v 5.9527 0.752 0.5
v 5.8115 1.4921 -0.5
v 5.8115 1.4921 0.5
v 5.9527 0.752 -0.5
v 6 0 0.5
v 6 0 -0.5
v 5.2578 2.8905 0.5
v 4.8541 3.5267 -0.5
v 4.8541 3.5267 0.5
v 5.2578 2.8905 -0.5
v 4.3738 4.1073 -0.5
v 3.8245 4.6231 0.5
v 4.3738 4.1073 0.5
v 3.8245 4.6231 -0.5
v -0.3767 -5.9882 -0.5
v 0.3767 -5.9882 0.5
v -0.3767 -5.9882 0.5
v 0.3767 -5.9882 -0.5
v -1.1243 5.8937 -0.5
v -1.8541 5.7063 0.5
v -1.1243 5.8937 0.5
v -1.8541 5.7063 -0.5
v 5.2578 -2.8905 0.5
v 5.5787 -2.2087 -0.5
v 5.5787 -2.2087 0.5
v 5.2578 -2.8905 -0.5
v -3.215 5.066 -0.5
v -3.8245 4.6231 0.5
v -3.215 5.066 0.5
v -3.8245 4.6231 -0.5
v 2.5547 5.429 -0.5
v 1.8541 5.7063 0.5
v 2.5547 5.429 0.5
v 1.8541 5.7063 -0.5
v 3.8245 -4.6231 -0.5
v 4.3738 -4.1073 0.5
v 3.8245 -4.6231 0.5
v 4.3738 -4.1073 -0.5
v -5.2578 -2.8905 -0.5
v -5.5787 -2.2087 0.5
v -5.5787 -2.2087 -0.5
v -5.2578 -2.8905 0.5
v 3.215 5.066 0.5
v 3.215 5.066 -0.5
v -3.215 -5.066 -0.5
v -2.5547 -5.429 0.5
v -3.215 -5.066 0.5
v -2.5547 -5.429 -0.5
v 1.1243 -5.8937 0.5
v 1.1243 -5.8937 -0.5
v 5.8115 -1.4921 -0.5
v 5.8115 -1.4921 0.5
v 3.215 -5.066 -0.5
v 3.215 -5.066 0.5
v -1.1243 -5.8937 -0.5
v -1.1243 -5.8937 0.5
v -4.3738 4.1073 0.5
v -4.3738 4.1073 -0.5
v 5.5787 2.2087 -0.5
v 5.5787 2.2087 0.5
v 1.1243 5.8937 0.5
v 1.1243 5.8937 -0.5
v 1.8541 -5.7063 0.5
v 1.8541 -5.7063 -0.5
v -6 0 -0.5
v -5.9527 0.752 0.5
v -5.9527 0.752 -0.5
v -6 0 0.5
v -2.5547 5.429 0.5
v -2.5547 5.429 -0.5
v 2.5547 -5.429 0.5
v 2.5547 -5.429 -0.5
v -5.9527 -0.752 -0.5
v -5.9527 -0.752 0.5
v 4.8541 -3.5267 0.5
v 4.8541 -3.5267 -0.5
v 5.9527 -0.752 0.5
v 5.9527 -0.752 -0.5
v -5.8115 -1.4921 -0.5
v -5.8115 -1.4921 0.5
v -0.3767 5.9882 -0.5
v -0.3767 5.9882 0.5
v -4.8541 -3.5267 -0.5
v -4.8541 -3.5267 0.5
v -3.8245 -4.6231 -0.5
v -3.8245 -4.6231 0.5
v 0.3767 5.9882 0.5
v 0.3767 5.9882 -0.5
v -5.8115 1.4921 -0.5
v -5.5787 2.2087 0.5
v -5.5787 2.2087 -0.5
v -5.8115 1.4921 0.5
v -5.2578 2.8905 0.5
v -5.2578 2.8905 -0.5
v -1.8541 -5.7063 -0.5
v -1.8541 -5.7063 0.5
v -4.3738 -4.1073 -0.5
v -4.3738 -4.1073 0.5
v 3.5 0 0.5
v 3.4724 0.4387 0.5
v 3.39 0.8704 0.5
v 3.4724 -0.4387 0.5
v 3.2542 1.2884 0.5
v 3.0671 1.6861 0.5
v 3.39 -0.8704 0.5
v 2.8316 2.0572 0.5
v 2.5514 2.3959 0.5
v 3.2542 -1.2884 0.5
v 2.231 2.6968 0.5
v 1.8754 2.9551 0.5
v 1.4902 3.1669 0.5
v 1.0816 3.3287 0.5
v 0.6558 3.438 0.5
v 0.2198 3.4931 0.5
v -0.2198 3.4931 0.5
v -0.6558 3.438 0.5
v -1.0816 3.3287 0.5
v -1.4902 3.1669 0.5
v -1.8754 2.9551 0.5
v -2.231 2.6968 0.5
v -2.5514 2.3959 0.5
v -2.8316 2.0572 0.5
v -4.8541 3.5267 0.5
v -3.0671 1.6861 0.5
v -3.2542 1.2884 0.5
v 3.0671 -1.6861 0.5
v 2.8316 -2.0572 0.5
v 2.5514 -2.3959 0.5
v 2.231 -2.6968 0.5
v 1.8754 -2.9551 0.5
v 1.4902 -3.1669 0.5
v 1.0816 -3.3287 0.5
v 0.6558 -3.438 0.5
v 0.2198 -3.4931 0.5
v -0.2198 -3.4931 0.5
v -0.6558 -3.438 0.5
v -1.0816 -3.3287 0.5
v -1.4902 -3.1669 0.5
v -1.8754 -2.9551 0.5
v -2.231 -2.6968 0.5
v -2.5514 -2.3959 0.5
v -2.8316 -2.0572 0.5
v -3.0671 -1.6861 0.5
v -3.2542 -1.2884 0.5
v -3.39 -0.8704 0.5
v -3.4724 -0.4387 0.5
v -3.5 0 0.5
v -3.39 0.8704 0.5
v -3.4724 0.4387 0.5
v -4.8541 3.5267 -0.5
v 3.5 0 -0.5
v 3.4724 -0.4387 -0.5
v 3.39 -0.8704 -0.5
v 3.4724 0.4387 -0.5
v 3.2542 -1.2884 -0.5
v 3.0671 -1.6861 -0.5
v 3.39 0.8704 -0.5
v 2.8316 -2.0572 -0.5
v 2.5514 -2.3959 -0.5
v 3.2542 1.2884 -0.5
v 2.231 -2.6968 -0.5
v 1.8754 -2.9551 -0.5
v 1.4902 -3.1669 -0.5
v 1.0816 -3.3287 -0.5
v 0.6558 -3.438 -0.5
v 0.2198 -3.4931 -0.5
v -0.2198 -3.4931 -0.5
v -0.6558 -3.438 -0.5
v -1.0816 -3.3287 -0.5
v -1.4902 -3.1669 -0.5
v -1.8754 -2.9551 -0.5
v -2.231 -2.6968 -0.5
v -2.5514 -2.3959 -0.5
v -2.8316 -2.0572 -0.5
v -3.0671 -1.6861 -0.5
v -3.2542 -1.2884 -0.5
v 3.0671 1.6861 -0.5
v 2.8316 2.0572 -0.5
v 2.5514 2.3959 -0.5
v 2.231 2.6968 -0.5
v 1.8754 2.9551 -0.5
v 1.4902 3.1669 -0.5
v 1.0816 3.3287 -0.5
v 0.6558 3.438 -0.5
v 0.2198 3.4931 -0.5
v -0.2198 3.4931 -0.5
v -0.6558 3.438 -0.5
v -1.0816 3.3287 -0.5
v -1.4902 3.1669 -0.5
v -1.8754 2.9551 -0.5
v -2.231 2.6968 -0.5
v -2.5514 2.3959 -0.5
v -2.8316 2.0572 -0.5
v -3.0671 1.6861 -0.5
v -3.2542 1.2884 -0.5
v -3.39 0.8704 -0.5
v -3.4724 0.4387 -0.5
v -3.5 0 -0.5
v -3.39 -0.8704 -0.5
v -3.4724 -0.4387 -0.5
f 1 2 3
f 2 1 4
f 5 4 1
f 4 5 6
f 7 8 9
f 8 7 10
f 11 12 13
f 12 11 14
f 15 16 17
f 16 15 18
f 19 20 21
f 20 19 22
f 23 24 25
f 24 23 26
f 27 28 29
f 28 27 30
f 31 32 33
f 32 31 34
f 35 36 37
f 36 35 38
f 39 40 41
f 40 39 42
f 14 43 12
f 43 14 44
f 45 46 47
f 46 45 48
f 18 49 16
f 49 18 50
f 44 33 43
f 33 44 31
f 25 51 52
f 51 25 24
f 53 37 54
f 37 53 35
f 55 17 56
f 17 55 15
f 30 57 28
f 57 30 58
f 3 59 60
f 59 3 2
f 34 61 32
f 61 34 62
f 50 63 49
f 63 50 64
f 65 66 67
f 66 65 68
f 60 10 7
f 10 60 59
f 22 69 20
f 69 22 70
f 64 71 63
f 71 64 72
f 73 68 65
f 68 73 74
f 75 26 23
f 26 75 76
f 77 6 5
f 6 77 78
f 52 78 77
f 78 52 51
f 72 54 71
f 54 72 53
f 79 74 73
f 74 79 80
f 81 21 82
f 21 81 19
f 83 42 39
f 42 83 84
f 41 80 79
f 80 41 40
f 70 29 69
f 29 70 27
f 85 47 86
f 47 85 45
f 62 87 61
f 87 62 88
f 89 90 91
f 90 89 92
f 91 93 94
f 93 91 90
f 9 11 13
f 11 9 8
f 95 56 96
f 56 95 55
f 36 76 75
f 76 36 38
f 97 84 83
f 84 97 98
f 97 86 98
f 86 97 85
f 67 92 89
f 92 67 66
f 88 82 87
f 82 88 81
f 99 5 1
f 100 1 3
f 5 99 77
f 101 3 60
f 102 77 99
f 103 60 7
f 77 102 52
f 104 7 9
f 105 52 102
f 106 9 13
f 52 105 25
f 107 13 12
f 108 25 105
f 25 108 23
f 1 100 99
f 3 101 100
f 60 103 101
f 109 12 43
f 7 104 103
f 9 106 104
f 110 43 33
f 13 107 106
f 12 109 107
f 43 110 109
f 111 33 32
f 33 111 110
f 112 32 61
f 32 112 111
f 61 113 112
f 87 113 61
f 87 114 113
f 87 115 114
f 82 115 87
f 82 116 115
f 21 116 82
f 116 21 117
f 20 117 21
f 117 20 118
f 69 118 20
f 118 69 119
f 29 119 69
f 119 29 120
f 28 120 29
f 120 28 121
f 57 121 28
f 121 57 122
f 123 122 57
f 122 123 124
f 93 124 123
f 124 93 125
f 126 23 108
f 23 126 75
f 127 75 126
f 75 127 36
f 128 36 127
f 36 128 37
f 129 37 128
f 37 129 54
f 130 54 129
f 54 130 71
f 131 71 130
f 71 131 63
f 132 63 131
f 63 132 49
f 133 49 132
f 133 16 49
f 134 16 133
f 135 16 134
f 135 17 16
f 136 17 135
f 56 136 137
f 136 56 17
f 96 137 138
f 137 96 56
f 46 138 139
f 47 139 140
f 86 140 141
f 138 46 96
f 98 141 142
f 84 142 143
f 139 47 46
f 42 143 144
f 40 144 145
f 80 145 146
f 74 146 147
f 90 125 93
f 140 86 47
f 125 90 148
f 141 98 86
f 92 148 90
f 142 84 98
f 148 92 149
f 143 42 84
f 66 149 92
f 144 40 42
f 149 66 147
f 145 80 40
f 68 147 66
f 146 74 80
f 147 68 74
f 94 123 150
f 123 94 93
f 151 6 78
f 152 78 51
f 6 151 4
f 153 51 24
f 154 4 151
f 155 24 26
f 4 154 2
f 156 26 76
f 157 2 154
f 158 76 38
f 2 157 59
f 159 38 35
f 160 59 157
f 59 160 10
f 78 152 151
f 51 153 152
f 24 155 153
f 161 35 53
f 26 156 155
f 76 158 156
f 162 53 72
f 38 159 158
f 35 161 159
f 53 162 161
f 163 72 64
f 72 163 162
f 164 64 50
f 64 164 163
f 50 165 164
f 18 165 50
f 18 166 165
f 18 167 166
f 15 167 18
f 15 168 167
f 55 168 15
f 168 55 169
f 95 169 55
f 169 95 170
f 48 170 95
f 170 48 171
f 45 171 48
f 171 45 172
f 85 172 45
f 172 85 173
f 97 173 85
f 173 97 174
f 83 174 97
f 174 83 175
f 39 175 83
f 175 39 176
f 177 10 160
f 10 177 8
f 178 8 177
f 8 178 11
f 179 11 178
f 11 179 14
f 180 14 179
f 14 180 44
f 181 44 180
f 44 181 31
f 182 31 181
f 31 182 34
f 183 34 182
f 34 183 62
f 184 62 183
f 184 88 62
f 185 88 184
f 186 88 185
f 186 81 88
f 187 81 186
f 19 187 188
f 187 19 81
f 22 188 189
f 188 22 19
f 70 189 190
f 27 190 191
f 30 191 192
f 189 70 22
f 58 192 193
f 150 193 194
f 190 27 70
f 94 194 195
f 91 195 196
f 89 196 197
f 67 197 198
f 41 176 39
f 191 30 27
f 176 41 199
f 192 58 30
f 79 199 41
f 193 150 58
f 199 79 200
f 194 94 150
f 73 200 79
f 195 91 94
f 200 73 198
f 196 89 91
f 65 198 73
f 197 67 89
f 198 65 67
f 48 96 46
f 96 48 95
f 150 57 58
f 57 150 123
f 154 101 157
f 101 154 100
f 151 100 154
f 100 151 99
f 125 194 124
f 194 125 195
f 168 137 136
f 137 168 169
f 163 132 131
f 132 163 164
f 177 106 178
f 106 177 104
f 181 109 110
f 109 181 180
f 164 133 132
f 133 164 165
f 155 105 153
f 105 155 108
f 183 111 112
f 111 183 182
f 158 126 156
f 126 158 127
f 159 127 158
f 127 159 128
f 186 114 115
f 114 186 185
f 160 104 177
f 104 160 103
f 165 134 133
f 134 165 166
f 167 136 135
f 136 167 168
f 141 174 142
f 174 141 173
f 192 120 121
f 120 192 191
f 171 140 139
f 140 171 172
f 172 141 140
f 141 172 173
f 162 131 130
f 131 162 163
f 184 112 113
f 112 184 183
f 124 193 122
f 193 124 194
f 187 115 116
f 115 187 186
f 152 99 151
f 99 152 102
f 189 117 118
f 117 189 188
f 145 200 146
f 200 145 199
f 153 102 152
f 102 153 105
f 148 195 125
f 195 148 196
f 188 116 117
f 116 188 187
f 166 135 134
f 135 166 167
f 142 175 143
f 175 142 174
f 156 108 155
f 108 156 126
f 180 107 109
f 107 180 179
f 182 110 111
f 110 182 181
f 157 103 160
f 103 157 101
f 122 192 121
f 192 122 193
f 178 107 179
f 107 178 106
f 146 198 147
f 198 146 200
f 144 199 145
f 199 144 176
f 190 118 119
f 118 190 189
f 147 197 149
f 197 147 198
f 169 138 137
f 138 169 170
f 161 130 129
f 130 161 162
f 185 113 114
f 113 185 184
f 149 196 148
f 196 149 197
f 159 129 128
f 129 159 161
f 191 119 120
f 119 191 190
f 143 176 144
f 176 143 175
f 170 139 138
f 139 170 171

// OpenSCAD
$fn = 50;


difference() {
	union() {
		translate(v = [0, 0, -0.5000000000]) {
			cylinder(h = 1, r = 6.0000000000);
		}
	}
	union() {
		translate(v = [0, 0, -100.0000000000]) {
			cylinder(h = 200, r = 3.5000000000);
		}
	}
}
